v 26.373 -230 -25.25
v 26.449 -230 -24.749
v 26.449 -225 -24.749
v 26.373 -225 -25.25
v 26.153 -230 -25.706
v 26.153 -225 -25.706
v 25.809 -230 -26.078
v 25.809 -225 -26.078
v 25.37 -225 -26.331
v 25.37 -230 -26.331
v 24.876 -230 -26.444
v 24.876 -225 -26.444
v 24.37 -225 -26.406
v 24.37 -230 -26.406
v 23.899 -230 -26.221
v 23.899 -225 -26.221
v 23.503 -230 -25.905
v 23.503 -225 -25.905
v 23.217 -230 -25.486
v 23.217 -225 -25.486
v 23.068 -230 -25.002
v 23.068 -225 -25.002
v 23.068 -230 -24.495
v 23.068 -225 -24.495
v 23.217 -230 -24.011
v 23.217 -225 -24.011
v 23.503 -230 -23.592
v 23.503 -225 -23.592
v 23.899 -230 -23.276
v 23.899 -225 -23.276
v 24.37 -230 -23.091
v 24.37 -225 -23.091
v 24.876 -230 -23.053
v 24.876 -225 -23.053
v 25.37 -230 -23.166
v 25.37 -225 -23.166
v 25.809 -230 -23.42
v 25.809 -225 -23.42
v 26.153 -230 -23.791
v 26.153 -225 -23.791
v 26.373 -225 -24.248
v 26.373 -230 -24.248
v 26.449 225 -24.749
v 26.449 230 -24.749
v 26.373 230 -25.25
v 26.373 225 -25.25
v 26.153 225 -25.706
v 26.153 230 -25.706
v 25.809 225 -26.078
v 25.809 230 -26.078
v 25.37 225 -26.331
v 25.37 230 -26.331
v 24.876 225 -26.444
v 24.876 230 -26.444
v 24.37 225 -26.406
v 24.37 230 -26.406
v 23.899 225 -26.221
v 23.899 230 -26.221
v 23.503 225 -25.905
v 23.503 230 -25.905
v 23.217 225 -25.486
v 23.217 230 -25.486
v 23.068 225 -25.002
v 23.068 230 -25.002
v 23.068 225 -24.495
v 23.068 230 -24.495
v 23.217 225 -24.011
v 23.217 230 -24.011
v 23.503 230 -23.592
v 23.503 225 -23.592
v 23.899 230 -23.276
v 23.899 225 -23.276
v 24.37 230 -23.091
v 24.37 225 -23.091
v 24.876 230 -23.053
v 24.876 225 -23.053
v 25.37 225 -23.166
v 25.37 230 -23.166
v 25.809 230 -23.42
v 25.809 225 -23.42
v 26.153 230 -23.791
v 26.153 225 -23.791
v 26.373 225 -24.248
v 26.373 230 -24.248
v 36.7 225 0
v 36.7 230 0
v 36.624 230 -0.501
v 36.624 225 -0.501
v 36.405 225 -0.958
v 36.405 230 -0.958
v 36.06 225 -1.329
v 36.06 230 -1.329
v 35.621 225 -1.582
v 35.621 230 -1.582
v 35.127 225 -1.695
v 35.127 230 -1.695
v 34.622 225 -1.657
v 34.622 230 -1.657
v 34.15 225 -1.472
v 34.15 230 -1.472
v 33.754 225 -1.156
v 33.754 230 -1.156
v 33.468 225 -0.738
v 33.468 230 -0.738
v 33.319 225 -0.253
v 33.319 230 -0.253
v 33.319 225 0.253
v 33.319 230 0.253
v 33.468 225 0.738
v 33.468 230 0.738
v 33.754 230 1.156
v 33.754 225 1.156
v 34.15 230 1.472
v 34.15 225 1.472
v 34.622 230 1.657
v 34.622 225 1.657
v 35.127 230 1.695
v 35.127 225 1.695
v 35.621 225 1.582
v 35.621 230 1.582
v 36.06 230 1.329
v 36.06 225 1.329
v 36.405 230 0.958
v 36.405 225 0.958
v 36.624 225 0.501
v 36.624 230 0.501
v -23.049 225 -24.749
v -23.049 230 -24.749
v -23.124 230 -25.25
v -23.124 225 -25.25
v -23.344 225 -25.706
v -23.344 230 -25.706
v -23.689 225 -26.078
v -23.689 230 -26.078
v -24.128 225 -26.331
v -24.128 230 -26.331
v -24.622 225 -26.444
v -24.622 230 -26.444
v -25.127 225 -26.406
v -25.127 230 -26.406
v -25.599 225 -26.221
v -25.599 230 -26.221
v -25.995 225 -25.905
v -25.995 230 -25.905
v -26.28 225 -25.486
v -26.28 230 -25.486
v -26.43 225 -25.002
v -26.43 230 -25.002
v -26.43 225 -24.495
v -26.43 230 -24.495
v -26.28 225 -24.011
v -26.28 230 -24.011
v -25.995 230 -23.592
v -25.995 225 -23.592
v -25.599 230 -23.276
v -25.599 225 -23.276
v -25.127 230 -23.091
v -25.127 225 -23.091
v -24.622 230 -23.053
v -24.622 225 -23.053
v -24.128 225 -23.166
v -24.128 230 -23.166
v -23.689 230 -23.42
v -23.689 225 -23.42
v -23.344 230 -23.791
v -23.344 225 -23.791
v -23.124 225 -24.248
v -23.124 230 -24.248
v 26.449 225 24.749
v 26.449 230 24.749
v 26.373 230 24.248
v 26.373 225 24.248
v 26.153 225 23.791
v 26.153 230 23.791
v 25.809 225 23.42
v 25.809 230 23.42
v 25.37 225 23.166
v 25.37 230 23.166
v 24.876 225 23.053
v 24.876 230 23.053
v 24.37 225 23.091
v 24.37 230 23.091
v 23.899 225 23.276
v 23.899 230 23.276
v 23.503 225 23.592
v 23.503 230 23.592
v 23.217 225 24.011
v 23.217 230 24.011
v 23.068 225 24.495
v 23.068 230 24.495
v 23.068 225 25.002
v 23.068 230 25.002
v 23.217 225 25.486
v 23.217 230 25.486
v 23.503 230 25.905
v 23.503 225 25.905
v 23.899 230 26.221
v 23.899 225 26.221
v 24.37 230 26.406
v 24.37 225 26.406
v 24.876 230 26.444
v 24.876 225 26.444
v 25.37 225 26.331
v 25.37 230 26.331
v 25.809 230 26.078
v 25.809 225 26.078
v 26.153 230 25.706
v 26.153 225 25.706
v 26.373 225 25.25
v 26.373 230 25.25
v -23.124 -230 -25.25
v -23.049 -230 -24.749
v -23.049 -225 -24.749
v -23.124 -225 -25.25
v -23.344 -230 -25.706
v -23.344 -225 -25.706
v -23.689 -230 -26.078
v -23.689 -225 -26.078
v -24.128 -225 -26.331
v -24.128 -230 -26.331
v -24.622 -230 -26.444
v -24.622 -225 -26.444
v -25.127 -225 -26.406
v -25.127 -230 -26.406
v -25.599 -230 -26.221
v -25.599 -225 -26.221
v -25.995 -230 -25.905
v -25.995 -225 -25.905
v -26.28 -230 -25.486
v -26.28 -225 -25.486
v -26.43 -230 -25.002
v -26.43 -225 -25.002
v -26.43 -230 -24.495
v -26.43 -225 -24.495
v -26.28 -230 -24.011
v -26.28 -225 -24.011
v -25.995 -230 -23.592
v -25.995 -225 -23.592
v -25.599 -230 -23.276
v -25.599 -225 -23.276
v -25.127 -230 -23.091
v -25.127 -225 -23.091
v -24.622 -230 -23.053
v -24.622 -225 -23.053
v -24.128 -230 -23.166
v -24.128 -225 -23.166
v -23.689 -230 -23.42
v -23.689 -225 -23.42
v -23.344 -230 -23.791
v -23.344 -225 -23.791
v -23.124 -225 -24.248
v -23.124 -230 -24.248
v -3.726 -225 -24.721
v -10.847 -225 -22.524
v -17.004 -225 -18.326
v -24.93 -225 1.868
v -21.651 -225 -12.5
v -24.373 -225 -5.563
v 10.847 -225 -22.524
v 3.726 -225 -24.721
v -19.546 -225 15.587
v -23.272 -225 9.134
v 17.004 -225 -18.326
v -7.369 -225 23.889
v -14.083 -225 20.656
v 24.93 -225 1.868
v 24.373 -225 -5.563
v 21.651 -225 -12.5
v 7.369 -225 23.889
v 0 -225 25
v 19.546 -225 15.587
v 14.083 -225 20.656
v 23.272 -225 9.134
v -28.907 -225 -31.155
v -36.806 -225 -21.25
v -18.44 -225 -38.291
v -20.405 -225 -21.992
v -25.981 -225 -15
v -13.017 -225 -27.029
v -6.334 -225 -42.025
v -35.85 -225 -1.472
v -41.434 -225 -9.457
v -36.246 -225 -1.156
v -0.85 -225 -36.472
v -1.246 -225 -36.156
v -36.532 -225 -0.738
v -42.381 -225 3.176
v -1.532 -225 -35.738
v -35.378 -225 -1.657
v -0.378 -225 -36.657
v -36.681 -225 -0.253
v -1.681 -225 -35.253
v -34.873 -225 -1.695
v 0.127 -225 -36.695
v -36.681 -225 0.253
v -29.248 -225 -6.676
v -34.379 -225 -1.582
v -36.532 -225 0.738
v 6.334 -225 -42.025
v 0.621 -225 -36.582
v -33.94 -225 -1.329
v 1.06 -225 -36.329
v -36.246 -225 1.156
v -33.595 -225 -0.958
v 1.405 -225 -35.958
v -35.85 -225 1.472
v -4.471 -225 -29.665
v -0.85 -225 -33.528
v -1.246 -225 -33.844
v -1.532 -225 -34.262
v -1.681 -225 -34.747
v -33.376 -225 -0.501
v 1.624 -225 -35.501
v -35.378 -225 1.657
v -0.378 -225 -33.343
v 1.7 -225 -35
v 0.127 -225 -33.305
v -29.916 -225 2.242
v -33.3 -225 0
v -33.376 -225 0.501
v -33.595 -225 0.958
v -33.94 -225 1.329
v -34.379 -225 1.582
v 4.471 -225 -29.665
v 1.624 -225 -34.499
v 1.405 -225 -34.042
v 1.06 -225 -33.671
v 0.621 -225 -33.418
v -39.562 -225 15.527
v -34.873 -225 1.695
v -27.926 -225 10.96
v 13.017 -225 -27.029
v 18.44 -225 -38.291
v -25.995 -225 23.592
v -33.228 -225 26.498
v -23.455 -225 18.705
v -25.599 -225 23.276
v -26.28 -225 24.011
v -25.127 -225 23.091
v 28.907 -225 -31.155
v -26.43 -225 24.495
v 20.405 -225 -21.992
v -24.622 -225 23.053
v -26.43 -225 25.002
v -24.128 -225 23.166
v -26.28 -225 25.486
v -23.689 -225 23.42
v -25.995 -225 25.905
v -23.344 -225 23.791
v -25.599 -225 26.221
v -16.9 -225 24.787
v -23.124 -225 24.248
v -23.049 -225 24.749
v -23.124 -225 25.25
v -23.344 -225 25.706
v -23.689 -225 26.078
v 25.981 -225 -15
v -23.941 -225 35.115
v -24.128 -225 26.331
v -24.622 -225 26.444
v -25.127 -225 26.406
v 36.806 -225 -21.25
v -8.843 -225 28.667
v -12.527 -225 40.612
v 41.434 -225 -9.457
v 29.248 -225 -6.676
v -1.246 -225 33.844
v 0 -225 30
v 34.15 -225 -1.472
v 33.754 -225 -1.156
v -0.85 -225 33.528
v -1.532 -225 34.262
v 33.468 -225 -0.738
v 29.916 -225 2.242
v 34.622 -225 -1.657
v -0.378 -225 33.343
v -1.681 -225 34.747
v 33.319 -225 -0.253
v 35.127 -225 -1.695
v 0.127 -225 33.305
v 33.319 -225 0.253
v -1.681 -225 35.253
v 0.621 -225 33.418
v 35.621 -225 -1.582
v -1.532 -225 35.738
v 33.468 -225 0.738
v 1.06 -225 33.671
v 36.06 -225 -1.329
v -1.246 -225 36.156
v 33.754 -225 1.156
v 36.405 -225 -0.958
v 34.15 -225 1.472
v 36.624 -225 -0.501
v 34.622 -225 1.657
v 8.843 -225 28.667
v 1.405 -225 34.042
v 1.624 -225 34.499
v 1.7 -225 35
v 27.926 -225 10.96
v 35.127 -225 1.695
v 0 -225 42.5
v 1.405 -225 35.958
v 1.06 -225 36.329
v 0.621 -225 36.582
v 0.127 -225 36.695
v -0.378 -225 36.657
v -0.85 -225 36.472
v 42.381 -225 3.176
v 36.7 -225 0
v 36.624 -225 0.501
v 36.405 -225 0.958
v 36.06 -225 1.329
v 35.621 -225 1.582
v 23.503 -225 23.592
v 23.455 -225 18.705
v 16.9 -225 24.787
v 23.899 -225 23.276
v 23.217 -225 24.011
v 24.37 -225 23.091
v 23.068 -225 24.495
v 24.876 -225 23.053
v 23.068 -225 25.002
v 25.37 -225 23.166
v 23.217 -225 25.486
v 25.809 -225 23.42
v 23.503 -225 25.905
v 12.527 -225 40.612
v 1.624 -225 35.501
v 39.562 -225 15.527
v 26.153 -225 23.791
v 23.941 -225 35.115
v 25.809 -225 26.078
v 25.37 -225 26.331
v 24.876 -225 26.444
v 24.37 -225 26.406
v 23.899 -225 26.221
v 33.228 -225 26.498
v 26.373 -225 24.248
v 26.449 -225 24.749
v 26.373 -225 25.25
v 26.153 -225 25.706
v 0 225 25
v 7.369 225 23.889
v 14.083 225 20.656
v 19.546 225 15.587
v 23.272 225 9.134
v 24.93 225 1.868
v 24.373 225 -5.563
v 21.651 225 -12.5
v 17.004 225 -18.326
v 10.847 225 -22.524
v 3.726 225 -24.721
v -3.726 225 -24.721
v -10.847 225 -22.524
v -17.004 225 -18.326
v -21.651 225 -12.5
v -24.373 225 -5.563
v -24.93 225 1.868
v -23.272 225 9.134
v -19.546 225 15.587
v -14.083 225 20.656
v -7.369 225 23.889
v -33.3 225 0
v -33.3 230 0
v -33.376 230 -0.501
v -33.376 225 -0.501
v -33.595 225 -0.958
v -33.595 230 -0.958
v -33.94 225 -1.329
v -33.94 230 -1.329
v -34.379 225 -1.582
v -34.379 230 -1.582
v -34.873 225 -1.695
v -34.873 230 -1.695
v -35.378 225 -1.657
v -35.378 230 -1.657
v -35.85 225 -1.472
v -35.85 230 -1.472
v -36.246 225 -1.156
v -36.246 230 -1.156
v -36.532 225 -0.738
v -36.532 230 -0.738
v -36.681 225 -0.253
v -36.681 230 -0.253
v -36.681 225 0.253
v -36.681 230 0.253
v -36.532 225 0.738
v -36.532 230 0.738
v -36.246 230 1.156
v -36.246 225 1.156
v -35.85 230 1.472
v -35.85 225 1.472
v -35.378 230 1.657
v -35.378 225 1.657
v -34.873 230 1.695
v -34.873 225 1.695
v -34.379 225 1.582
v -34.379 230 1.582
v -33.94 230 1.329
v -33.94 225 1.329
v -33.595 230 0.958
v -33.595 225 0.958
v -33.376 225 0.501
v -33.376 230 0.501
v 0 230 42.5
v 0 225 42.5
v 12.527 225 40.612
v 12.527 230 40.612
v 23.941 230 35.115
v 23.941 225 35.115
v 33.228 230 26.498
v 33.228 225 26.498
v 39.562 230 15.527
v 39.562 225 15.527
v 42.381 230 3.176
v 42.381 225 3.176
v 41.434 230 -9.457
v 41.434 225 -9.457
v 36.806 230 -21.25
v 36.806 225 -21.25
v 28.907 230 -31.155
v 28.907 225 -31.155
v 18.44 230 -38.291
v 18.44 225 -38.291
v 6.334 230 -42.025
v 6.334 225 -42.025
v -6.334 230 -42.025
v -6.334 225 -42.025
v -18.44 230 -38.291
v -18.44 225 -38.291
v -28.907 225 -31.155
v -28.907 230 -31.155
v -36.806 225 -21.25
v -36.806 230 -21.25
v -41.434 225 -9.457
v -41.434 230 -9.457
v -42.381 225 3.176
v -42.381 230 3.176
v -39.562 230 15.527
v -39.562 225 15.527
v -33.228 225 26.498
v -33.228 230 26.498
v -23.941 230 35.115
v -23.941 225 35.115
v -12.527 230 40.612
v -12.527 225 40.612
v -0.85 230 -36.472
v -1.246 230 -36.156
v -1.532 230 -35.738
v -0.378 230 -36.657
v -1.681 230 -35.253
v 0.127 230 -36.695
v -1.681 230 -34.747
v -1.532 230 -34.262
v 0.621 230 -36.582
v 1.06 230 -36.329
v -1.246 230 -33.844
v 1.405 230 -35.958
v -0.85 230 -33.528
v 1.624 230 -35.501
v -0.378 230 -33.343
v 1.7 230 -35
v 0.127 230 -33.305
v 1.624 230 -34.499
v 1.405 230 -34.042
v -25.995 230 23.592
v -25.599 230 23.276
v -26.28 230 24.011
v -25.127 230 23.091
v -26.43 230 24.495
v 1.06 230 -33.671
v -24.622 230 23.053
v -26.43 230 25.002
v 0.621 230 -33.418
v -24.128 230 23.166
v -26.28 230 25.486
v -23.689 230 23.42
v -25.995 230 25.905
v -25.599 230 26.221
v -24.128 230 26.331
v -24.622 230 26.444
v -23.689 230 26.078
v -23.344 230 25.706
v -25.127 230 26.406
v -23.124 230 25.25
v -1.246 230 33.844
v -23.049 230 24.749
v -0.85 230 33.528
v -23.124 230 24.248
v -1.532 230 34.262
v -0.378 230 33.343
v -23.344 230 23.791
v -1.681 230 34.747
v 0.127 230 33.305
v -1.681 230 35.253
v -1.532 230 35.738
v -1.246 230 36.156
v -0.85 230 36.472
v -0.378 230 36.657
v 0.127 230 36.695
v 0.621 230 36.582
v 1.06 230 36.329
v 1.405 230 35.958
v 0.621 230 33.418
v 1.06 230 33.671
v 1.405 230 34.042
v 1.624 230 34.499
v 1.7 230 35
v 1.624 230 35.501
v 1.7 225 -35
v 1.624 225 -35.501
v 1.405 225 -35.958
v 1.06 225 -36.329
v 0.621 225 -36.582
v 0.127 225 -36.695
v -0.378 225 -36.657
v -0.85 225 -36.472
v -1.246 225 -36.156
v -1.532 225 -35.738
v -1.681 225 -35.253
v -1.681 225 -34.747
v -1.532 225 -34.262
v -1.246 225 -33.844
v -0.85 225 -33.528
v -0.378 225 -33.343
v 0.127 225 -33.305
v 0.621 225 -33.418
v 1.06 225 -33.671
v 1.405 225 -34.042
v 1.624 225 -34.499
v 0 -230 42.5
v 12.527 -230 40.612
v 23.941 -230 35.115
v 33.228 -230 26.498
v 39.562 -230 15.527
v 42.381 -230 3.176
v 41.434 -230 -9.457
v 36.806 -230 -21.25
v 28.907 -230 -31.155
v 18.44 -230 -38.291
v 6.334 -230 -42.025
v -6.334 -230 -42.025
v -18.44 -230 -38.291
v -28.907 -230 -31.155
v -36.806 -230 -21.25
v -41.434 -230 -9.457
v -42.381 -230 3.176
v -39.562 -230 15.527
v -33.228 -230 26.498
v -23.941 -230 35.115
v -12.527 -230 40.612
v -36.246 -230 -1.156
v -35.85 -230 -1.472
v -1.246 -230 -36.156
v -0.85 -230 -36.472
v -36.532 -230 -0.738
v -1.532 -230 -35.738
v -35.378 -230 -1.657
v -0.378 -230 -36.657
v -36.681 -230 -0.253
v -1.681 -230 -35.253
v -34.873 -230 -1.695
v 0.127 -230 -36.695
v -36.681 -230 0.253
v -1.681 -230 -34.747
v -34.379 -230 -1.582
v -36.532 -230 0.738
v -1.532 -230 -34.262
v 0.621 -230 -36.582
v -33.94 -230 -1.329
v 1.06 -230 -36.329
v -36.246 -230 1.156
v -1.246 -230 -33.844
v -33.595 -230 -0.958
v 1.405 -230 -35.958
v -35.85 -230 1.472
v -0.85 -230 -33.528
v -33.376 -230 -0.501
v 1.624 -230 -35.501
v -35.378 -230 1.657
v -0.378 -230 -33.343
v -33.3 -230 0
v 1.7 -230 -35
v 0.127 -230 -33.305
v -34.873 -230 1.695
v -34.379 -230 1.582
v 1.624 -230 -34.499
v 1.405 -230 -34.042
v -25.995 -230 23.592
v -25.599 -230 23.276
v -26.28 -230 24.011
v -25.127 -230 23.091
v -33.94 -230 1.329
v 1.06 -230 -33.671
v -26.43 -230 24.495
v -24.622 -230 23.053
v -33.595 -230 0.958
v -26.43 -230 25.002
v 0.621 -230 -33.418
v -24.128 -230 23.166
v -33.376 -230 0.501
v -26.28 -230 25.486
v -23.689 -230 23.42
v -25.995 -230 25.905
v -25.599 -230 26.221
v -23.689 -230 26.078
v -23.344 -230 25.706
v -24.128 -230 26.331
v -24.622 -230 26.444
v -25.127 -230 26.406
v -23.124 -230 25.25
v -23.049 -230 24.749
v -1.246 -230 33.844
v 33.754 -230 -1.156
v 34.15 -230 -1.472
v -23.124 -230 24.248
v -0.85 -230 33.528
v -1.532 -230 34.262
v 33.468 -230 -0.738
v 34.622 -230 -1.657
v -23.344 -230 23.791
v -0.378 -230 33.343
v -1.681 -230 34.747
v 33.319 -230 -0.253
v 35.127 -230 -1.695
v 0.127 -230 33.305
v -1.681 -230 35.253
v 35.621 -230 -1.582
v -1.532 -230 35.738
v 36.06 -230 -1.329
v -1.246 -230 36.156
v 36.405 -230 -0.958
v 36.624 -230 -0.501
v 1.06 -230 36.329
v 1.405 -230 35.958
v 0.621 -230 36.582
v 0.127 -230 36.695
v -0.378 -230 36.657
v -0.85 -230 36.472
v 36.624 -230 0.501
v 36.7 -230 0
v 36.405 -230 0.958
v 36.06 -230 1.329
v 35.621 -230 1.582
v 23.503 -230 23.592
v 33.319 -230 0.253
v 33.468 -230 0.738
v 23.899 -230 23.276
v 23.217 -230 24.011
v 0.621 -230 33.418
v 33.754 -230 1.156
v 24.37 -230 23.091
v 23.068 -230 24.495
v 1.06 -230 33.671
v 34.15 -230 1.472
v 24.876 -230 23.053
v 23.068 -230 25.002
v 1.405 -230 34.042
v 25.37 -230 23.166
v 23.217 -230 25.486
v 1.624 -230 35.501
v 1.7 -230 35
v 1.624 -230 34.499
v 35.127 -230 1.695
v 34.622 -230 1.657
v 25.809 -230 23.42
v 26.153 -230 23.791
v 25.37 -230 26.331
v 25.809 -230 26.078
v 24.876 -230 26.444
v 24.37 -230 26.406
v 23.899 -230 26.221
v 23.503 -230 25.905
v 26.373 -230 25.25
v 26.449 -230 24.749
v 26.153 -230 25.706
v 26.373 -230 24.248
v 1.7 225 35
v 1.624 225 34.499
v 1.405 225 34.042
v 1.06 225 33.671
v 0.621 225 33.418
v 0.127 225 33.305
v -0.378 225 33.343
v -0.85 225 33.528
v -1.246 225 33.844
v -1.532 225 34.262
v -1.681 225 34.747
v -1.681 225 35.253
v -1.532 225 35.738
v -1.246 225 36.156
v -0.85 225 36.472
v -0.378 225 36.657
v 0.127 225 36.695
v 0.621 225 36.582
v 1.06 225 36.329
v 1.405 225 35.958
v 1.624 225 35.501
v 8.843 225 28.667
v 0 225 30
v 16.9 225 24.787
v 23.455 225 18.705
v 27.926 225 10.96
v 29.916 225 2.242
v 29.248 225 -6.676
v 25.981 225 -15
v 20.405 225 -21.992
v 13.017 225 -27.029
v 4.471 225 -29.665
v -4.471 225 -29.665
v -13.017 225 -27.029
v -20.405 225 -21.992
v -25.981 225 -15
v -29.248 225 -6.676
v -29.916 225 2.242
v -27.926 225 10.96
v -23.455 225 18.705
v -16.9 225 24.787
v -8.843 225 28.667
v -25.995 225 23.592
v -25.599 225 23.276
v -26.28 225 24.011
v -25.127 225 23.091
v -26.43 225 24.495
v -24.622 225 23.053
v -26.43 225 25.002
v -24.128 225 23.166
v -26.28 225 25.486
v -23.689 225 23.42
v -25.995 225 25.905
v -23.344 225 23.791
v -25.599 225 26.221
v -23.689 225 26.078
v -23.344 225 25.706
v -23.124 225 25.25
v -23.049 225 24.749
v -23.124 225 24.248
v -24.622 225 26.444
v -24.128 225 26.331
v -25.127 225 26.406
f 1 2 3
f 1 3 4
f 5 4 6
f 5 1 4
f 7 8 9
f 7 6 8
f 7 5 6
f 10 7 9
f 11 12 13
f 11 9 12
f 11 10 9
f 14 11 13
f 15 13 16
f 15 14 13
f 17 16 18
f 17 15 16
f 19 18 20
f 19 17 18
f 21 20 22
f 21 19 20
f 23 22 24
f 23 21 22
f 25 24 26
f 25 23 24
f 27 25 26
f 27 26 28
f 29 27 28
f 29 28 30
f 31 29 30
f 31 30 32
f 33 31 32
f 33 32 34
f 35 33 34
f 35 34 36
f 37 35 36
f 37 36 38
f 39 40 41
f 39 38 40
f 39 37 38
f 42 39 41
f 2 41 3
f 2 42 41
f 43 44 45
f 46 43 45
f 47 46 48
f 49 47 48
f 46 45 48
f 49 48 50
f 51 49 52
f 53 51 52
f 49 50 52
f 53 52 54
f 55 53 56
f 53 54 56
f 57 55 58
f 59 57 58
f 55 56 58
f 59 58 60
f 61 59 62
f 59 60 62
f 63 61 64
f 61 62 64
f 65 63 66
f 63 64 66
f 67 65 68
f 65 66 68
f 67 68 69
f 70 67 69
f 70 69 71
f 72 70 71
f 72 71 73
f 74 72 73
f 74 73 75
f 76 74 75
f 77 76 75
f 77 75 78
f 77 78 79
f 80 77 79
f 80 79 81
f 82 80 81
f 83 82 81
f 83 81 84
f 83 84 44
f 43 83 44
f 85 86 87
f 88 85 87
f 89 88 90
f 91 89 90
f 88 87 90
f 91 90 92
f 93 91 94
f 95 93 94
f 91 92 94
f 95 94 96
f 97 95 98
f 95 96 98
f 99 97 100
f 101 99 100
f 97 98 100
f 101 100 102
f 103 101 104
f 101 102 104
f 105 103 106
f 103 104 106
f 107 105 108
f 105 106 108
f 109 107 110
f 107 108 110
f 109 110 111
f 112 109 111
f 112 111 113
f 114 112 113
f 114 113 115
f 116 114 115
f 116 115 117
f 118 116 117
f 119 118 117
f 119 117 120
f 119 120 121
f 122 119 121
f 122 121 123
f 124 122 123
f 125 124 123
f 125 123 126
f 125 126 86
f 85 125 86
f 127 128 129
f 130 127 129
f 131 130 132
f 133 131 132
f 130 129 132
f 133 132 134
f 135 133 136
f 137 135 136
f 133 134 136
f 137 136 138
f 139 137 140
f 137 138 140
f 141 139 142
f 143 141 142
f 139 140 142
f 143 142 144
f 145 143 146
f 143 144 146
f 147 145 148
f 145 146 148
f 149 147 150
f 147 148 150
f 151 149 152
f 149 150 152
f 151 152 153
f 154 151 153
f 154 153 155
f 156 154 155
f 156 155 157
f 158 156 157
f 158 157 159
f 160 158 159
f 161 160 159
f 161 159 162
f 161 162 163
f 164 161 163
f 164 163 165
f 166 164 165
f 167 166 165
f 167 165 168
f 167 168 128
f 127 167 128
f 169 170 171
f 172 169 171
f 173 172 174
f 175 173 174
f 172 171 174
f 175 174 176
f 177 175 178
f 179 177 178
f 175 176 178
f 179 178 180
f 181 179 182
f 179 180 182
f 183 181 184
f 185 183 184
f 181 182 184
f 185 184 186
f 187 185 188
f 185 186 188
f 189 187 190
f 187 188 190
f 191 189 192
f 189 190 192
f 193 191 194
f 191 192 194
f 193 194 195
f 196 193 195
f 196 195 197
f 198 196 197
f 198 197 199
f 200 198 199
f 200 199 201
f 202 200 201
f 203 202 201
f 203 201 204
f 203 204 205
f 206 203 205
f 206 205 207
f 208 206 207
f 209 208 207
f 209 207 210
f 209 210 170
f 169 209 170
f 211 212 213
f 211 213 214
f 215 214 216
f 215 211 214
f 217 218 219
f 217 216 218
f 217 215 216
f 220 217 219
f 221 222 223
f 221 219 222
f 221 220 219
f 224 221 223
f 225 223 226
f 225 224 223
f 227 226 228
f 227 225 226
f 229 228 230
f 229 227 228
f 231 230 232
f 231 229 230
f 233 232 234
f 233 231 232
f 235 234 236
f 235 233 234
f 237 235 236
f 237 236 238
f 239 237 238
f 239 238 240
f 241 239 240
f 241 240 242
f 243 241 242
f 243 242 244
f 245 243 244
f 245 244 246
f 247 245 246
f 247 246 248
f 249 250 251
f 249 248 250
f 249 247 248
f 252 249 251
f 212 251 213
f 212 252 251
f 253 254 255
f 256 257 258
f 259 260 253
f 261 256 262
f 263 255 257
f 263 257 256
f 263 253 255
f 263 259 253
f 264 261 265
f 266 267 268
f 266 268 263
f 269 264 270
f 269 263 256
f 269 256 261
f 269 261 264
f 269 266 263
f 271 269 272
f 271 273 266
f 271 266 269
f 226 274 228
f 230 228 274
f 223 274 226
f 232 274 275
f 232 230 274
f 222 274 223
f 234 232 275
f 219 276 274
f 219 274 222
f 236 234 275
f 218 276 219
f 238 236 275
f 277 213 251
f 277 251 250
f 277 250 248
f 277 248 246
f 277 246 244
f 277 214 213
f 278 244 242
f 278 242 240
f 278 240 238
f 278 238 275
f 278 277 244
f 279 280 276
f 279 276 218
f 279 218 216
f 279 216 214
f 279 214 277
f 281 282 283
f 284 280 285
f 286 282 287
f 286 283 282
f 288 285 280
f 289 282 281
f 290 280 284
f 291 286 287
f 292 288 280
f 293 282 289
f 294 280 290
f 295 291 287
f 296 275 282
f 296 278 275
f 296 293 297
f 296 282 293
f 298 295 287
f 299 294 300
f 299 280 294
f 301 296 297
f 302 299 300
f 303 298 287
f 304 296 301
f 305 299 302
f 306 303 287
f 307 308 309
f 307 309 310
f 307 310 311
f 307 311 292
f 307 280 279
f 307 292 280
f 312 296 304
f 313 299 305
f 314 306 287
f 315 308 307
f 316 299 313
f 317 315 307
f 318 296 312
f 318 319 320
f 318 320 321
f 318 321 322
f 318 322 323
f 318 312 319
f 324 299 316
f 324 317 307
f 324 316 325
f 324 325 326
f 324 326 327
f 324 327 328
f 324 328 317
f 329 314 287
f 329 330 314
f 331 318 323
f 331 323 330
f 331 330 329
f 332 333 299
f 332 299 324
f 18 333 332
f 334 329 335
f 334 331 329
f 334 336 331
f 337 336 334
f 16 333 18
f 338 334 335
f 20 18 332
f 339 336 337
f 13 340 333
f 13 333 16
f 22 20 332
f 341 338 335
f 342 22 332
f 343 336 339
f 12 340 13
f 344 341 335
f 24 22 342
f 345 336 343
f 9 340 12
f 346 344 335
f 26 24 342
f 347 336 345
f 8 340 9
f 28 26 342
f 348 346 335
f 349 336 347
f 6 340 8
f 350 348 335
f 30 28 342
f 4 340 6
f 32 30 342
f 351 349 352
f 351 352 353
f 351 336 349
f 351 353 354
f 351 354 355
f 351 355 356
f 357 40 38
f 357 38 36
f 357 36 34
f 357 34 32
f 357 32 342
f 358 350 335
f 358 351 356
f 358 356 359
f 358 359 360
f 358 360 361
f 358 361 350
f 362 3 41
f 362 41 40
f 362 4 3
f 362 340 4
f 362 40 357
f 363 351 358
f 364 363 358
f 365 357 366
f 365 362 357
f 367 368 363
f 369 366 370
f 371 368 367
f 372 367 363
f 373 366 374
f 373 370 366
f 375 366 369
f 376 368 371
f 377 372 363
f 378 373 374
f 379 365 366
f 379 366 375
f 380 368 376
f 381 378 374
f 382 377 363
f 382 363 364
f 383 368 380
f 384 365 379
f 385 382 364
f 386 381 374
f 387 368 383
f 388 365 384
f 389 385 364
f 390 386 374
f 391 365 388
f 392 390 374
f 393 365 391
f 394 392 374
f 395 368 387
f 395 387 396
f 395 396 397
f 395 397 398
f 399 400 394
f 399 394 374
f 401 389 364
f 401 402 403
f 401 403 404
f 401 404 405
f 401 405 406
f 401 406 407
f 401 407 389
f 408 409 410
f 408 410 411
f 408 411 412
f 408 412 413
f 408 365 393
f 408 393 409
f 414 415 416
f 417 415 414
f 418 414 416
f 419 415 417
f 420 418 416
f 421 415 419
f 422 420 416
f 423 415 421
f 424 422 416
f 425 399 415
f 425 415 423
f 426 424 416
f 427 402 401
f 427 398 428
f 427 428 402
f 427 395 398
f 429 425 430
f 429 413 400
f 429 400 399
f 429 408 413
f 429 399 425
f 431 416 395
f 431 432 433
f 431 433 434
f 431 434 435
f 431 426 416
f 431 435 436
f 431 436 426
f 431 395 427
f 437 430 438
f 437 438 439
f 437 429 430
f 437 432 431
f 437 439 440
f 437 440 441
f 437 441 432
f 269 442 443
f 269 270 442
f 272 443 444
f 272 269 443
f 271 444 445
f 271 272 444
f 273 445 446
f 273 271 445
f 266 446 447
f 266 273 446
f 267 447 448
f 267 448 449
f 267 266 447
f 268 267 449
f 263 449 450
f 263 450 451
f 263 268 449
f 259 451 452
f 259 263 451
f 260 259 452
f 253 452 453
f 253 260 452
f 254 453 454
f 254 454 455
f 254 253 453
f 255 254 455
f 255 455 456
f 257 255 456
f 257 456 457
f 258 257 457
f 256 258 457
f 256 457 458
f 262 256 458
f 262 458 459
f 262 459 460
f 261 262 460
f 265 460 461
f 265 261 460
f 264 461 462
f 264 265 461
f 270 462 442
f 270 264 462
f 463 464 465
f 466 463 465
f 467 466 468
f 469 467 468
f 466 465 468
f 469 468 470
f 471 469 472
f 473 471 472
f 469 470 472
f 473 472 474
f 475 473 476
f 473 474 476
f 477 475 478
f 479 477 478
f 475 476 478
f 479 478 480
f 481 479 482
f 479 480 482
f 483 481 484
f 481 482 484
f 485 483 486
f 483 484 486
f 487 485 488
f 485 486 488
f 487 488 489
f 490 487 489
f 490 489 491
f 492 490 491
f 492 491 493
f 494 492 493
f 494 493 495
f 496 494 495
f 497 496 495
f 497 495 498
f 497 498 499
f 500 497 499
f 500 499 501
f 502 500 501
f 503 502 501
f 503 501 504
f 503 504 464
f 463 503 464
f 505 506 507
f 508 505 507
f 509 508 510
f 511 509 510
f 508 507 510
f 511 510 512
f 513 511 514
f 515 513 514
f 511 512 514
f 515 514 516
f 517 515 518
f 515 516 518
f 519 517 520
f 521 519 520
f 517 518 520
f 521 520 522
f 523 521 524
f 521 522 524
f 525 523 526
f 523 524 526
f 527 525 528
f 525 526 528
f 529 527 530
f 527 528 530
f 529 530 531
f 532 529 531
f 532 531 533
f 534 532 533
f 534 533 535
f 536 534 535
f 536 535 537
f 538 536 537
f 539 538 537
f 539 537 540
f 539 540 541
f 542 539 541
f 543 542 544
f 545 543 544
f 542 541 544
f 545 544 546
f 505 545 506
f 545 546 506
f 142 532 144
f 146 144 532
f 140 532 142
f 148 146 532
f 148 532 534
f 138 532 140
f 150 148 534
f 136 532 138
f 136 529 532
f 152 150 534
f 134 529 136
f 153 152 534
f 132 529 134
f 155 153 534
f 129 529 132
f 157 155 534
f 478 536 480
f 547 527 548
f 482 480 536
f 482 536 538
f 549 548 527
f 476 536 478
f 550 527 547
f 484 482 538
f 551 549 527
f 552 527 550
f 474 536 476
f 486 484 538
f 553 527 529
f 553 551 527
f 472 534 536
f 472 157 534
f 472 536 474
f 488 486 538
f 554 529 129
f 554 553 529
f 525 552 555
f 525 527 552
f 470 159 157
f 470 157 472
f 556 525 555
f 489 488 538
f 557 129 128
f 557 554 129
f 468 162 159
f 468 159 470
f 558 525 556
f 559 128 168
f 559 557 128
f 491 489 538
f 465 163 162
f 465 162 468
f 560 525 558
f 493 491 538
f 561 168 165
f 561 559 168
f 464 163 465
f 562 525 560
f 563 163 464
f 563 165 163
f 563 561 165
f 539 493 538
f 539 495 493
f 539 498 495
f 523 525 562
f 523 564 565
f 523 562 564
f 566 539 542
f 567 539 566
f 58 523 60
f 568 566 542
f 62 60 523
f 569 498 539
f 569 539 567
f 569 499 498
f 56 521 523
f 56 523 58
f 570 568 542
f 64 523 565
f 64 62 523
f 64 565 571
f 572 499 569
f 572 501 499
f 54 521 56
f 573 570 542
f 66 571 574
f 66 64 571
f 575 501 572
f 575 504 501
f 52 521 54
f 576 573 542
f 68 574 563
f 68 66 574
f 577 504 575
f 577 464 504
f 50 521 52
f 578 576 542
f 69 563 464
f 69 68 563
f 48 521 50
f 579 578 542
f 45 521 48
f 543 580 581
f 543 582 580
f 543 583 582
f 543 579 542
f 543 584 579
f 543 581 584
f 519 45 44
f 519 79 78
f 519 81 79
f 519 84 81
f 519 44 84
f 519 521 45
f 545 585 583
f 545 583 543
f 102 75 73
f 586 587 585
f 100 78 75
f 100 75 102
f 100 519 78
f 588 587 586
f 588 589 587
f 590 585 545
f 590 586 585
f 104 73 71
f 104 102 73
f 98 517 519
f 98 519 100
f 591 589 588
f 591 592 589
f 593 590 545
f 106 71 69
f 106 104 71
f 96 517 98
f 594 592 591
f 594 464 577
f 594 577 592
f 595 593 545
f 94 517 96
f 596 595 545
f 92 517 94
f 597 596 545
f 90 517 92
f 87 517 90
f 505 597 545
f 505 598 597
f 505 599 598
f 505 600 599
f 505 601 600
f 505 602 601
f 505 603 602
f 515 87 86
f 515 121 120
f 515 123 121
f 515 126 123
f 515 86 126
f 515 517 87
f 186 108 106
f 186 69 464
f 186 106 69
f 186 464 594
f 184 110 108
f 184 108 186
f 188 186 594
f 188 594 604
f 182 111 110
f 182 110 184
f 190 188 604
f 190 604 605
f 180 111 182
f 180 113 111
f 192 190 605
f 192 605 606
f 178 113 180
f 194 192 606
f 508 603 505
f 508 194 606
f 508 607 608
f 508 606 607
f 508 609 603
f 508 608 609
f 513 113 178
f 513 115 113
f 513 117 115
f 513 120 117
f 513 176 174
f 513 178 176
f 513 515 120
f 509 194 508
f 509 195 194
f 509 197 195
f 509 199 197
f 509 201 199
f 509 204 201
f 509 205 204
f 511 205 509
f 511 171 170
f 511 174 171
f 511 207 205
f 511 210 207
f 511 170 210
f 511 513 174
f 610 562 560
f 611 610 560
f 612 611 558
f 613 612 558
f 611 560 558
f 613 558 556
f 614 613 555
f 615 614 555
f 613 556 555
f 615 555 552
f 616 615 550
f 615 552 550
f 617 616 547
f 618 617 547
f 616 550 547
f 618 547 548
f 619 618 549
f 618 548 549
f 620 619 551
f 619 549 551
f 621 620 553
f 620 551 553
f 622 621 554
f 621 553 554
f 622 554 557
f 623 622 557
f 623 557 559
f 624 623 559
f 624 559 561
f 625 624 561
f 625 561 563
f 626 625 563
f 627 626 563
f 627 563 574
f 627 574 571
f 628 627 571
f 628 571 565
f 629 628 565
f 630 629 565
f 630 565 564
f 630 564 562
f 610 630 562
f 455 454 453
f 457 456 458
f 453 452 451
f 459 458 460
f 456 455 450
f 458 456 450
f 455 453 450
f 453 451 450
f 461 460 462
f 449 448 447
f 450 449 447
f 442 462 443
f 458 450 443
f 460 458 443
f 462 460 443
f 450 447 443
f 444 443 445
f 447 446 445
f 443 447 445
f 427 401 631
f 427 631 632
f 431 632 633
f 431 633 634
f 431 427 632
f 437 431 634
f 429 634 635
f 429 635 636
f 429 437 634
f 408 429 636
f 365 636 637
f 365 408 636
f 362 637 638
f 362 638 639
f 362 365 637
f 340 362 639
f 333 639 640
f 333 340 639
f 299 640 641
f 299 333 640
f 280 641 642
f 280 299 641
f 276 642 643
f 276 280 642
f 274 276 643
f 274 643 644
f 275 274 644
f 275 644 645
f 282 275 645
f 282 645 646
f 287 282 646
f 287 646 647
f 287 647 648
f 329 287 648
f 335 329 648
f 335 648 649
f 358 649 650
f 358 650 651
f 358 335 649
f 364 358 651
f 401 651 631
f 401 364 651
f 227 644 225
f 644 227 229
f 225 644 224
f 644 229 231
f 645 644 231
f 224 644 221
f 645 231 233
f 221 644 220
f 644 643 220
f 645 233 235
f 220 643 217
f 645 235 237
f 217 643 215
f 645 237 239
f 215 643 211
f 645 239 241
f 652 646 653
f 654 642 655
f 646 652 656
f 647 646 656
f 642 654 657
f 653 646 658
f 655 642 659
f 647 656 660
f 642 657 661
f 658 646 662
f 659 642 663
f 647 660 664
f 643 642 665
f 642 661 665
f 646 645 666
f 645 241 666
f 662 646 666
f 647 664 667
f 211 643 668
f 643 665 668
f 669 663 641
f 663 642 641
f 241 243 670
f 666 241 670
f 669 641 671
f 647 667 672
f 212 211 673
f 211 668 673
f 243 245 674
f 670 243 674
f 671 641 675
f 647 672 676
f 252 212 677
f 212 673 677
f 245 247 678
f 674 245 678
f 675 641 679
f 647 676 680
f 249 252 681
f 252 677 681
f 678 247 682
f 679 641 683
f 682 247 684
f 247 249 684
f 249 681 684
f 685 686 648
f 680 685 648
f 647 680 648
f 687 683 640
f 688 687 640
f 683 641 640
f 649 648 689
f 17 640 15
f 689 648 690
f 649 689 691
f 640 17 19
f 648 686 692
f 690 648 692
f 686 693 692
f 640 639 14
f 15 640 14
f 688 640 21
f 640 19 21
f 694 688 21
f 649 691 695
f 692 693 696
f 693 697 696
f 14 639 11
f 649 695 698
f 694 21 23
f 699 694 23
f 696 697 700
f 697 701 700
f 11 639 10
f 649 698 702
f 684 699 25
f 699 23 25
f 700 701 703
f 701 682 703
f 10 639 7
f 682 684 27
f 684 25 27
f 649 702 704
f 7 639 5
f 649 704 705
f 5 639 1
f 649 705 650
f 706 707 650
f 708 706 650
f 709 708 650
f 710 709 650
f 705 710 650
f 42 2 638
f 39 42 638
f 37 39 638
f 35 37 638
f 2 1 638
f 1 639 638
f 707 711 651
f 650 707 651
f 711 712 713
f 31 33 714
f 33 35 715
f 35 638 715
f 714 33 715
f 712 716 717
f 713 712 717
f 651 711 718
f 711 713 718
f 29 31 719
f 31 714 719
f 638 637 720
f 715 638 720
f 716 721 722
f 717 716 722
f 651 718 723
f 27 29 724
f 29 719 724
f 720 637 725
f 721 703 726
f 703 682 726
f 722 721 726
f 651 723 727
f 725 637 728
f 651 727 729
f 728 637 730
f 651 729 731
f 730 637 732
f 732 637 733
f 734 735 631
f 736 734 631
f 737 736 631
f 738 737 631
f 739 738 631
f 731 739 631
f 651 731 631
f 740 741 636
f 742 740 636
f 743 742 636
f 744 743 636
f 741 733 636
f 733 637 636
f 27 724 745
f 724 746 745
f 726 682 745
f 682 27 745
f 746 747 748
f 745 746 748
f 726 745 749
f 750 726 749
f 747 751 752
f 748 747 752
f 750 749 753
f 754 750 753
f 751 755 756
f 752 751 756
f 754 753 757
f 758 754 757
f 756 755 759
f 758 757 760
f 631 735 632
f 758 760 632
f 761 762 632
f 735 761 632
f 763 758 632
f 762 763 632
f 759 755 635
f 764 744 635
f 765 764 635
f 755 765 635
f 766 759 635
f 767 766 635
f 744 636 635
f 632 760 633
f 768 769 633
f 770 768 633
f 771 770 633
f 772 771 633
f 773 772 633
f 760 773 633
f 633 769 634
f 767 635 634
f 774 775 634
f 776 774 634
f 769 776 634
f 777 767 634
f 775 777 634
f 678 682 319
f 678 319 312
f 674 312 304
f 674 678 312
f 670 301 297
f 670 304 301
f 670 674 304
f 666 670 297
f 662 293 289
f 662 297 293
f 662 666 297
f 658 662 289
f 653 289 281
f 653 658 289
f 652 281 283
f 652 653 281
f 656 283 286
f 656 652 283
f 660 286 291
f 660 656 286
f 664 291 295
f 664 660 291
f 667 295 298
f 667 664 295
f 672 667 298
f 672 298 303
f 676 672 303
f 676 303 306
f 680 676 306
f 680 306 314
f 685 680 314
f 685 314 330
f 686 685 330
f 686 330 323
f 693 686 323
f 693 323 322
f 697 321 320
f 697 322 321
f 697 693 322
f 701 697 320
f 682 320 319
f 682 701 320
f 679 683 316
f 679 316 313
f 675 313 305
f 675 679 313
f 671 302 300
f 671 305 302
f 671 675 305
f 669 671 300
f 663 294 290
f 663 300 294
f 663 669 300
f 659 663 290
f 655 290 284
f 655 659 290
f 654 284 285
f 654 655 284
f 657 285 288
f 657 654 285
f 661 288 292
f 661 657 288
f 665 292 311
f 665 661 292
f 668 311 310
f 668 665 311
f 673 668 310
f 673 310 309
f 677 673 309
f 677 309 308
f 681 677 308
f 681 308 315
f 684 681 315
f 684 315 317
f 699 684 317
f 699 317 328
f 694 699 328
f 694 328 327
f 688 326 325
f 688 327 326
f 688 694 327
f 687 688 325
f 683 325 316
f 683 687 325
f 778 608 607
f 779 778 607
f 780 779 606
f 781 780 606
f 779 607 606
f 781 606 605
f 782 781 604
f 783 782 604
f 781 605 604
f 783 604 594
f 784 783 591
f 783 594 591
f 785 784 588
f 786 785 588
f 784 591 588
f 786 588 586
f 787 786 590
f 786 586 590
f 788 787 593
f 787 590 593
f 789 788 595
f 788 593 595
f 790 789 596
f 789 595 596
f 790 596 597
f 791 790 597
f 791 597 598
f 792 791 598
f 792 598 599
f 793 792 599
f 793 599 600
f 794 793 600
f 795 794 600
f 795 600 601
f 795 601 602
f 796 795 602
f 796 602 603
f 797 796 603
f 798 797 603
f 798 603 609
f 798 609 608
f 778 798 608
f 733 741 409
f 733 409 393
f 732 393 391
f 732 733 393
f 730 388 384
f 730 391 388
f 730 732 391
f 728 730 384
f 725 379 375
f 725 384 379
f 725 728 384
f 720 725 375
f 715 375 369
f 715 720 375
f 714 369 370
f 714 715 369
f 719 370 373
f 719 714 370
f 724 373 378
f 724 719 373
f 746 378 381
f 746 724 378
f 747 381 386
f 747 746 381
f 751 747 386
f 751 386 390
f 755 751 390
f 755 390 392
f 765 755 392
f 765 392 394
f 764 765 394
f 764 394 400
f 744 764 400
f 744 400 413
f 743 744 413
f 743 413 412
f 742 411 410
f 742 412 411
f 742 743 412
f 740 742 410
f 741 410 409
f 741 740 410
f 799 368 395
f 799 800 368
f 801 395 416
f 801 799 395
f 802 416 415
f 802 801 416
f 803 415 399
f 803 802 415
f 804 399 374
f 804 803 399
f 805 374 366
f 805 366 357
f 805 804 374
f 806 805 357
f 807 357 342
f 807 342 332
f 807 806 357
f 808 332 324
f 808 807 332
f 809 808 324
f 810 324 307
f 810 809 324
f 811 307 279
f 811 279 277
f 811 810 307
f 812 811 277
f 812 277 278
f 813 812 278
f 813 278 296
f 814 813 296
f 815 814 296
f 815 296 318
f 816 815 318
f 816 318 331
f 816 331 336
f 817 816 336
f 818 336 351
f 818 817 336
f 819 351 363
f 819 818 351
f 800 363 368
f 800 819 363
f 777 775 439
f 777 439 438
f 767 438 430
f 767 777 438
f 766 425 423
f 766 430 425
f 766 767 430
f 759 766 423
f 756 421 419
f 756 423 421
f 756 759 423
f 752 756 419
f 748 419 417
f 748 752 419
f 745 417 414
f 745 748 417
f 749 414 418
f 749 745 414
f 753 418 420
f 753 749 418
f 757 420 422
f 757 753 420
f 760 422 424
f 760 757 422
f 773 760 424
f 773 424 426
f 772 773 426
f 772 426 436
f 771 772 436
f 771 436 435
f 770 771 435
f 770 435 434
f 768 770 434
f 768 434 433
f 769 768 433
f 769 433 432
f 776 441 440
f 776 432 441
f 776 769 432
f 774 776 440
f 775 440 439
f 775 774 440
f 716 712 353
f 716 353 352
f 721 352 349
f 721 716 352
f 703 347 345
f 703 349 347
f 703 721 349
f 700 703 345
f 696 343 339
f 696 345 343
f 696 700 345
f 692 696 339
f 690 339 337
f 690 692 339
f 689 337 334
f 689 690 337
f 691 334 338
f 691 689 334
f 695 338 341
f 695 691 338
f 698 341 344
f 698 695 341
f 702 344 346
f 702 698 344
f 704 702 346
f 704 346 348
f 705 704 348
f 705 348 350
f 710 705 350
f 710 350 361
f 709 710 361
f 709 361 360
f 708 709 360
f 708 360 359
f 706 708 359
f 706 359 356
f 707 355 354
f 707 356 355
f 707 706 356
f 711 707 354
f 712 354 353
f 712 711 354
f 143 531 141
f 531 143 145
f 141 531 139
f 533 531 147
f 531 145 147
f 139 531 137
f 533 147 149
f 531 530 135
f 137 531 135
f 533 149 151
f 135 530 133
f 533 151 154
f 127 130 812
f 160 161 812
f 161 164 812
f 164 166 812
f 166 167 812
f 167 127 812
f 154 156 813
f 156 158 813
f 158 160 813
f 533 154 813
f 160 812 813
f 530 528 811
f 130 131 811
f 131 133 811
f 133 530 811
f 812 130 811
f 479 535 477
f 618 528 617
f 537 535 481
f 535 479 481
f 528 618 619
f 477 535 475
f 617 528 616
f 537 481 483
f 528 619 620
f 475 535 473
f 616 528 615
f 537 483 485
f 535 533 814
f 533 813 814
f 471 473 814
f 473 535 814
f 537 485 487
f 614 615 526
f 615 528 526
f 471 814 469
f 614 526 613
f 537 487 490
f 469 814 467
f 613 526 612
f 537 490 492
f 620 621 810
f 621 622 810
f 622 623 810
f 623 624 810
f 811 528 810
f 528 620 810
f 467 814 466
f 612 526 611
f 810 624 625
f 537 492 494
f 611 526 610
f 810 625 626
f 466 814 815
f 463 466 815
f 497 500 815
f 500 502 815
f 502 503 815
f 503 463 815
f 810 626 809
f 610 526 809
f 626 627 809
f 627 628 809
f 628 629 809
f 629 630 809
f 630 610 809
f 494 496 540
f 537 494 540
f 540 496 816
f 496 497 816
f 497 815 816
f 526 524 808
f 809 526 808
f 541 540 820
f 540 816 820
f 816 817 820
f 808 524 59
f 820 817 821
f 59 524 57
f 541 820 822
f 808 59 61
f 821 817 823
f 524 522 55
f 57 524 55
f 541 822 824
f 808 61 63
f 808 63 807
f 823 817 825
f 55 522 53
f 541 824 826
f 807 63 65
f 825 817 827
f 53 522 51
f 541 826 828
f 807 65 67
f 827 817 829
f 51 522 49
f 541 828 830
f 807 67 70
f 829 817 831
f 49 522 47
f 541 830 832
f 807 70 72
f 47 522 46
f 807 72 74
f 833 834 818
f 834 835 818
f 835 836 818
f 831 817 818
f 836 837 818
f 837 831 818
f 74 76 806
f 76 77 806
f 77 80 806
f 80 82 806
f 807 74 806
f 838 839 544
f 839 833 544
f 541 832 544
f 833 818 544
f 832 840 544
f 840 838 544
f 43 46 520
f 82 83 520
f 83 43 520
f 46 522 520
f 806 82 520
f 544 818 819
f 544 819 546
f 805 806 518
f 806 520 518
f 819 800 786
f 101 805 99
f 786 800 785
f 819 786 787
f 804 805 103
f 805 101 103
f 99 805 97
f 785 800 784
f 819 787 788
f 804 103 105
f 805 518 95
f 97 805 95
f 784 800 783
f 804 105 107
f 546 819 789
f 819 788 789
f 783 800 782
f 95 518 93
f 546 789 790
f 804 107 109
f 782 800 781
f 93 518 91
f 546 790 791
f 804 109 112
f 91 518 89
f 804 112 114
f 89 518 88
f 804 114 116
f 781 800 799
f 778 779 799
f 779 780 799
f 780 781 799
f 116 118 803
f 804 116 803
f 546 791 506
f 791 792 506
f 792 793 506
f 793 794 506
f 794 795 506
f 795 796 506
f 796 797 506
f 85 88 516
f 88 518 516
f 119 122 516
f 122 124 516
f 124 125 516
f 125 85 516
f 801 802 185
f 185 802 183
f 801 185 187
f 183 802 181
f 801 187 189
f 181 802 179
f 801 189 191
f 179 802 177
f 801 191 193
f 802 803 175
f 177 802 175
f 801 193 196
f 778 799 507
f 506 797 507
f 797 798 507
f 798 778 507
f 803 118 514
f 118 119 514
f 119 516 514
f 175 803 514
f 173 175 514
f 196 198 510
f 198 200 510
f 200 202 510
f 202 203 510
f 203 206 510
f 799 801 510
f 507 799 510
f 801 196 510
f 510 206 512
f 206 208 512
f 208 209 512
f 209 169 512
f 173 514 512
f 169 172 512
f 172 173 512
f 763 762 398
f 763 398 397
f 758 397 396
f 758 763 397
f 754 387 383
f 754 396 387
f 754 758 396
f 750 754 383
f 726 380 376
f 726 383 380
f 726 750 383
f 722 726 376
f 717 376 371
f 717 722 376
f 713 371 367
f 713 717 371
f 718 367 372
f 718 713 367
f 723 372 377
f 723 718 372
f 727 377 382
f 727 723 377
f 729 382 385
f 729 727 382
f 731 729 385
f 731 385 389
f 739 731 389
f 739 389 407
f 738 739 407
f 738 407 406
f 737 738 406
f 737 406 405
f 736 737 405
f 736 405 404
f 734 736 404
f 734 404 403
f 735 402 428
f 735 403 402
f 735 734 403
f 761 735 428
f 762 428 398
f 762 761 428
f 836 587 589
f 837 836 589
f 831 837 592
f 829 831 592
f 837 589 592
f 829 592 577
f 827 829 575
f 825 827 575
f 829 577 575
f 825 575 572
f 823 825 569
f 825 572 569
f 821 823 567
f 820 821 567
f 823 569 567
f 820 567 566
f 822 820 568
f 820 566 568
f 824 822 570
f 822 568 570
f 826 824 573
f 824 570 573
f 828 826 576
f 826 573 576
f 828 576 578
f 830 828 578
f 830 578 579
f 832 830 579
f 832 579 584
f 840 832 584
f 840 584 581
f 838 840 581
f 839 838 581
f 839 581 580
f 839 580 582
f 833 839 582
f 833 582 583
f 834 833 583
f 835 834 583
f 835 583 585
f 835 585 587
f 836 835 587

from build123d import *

# Parameters (mm, degrees)
CROQUIS1_R                   = 30
CROQUIS1_R_2                 = 25
SALIENTE_EXTRUIR1_DEPTH      = 225
CROQUIS2_R                   = 42.5
SALIENTE_EXTRUIR2_DEPTH      = 5
TALADRO_DE_MARGEN_PARA_M31_D = 3.4


with BuildPart() as part:
    # Croquis1 → Saliente-Extruir1 (new, symmetric)
    with BuildSketch(Plane(origin=(0, 0, 0), x_dir=(1, 0, 0), z_dir=(0, 1, 0))):
        with Locations(Location((0, 0, 0), (0, 0, 270))):
            Circle(CROQUIS1_R)
        with Locations(Location((0, 0, 0), (0, 0, 270))):
            Circle(CROQUIS1_R_2, mode=Mode.SUBTRACT)
    extrude(amount=SALIENTE_EXTRUIR1_DEPTH, both=True)

    # Croquis2 → Saliente-Extruir2 (add)
    with BuildSketch(Plane(origin=(0, 225, 0), x_dir=(1, 0, 0), z_dir=(0, 1, 0))):
        with Locations(Location((0, 0, 0), (0, 0, 270))):
            Circle(CROQUIS2_R)
    saliente_extruir2 = extrude(amount=SALIENTE_EXTRUIR2_DEPTH)

    # Taladro de margen para M31 (through all)
    with Locations(Plane(origin=(0, 225, 0), x_dir=(-1, 0, 0), z_dir=(0, -1, 0))):
        with Locations((0, -35), (-24.748737342, -24.748737342), (-35, 0), (-24.748737342, 24.748737342), (0, 35), (24.748737342, 24.748737342), (35, 0), (24.748737342, -24.748737342)):
            taladro_de_margen_para_m31 = Hole(TALADRO_DE_MARGEN_PARA_M31_D / 2)

    # Simetría1: Saliente-Extruir2, Taladro de margen para M31 across plane
    add(saliente_extruir2.mirror(Plane.ZX))
    add(taladro_de_margen_para_m31.mirror(Plane.ZX), mode=Mode.SUBTRACT)


solid = part.part
